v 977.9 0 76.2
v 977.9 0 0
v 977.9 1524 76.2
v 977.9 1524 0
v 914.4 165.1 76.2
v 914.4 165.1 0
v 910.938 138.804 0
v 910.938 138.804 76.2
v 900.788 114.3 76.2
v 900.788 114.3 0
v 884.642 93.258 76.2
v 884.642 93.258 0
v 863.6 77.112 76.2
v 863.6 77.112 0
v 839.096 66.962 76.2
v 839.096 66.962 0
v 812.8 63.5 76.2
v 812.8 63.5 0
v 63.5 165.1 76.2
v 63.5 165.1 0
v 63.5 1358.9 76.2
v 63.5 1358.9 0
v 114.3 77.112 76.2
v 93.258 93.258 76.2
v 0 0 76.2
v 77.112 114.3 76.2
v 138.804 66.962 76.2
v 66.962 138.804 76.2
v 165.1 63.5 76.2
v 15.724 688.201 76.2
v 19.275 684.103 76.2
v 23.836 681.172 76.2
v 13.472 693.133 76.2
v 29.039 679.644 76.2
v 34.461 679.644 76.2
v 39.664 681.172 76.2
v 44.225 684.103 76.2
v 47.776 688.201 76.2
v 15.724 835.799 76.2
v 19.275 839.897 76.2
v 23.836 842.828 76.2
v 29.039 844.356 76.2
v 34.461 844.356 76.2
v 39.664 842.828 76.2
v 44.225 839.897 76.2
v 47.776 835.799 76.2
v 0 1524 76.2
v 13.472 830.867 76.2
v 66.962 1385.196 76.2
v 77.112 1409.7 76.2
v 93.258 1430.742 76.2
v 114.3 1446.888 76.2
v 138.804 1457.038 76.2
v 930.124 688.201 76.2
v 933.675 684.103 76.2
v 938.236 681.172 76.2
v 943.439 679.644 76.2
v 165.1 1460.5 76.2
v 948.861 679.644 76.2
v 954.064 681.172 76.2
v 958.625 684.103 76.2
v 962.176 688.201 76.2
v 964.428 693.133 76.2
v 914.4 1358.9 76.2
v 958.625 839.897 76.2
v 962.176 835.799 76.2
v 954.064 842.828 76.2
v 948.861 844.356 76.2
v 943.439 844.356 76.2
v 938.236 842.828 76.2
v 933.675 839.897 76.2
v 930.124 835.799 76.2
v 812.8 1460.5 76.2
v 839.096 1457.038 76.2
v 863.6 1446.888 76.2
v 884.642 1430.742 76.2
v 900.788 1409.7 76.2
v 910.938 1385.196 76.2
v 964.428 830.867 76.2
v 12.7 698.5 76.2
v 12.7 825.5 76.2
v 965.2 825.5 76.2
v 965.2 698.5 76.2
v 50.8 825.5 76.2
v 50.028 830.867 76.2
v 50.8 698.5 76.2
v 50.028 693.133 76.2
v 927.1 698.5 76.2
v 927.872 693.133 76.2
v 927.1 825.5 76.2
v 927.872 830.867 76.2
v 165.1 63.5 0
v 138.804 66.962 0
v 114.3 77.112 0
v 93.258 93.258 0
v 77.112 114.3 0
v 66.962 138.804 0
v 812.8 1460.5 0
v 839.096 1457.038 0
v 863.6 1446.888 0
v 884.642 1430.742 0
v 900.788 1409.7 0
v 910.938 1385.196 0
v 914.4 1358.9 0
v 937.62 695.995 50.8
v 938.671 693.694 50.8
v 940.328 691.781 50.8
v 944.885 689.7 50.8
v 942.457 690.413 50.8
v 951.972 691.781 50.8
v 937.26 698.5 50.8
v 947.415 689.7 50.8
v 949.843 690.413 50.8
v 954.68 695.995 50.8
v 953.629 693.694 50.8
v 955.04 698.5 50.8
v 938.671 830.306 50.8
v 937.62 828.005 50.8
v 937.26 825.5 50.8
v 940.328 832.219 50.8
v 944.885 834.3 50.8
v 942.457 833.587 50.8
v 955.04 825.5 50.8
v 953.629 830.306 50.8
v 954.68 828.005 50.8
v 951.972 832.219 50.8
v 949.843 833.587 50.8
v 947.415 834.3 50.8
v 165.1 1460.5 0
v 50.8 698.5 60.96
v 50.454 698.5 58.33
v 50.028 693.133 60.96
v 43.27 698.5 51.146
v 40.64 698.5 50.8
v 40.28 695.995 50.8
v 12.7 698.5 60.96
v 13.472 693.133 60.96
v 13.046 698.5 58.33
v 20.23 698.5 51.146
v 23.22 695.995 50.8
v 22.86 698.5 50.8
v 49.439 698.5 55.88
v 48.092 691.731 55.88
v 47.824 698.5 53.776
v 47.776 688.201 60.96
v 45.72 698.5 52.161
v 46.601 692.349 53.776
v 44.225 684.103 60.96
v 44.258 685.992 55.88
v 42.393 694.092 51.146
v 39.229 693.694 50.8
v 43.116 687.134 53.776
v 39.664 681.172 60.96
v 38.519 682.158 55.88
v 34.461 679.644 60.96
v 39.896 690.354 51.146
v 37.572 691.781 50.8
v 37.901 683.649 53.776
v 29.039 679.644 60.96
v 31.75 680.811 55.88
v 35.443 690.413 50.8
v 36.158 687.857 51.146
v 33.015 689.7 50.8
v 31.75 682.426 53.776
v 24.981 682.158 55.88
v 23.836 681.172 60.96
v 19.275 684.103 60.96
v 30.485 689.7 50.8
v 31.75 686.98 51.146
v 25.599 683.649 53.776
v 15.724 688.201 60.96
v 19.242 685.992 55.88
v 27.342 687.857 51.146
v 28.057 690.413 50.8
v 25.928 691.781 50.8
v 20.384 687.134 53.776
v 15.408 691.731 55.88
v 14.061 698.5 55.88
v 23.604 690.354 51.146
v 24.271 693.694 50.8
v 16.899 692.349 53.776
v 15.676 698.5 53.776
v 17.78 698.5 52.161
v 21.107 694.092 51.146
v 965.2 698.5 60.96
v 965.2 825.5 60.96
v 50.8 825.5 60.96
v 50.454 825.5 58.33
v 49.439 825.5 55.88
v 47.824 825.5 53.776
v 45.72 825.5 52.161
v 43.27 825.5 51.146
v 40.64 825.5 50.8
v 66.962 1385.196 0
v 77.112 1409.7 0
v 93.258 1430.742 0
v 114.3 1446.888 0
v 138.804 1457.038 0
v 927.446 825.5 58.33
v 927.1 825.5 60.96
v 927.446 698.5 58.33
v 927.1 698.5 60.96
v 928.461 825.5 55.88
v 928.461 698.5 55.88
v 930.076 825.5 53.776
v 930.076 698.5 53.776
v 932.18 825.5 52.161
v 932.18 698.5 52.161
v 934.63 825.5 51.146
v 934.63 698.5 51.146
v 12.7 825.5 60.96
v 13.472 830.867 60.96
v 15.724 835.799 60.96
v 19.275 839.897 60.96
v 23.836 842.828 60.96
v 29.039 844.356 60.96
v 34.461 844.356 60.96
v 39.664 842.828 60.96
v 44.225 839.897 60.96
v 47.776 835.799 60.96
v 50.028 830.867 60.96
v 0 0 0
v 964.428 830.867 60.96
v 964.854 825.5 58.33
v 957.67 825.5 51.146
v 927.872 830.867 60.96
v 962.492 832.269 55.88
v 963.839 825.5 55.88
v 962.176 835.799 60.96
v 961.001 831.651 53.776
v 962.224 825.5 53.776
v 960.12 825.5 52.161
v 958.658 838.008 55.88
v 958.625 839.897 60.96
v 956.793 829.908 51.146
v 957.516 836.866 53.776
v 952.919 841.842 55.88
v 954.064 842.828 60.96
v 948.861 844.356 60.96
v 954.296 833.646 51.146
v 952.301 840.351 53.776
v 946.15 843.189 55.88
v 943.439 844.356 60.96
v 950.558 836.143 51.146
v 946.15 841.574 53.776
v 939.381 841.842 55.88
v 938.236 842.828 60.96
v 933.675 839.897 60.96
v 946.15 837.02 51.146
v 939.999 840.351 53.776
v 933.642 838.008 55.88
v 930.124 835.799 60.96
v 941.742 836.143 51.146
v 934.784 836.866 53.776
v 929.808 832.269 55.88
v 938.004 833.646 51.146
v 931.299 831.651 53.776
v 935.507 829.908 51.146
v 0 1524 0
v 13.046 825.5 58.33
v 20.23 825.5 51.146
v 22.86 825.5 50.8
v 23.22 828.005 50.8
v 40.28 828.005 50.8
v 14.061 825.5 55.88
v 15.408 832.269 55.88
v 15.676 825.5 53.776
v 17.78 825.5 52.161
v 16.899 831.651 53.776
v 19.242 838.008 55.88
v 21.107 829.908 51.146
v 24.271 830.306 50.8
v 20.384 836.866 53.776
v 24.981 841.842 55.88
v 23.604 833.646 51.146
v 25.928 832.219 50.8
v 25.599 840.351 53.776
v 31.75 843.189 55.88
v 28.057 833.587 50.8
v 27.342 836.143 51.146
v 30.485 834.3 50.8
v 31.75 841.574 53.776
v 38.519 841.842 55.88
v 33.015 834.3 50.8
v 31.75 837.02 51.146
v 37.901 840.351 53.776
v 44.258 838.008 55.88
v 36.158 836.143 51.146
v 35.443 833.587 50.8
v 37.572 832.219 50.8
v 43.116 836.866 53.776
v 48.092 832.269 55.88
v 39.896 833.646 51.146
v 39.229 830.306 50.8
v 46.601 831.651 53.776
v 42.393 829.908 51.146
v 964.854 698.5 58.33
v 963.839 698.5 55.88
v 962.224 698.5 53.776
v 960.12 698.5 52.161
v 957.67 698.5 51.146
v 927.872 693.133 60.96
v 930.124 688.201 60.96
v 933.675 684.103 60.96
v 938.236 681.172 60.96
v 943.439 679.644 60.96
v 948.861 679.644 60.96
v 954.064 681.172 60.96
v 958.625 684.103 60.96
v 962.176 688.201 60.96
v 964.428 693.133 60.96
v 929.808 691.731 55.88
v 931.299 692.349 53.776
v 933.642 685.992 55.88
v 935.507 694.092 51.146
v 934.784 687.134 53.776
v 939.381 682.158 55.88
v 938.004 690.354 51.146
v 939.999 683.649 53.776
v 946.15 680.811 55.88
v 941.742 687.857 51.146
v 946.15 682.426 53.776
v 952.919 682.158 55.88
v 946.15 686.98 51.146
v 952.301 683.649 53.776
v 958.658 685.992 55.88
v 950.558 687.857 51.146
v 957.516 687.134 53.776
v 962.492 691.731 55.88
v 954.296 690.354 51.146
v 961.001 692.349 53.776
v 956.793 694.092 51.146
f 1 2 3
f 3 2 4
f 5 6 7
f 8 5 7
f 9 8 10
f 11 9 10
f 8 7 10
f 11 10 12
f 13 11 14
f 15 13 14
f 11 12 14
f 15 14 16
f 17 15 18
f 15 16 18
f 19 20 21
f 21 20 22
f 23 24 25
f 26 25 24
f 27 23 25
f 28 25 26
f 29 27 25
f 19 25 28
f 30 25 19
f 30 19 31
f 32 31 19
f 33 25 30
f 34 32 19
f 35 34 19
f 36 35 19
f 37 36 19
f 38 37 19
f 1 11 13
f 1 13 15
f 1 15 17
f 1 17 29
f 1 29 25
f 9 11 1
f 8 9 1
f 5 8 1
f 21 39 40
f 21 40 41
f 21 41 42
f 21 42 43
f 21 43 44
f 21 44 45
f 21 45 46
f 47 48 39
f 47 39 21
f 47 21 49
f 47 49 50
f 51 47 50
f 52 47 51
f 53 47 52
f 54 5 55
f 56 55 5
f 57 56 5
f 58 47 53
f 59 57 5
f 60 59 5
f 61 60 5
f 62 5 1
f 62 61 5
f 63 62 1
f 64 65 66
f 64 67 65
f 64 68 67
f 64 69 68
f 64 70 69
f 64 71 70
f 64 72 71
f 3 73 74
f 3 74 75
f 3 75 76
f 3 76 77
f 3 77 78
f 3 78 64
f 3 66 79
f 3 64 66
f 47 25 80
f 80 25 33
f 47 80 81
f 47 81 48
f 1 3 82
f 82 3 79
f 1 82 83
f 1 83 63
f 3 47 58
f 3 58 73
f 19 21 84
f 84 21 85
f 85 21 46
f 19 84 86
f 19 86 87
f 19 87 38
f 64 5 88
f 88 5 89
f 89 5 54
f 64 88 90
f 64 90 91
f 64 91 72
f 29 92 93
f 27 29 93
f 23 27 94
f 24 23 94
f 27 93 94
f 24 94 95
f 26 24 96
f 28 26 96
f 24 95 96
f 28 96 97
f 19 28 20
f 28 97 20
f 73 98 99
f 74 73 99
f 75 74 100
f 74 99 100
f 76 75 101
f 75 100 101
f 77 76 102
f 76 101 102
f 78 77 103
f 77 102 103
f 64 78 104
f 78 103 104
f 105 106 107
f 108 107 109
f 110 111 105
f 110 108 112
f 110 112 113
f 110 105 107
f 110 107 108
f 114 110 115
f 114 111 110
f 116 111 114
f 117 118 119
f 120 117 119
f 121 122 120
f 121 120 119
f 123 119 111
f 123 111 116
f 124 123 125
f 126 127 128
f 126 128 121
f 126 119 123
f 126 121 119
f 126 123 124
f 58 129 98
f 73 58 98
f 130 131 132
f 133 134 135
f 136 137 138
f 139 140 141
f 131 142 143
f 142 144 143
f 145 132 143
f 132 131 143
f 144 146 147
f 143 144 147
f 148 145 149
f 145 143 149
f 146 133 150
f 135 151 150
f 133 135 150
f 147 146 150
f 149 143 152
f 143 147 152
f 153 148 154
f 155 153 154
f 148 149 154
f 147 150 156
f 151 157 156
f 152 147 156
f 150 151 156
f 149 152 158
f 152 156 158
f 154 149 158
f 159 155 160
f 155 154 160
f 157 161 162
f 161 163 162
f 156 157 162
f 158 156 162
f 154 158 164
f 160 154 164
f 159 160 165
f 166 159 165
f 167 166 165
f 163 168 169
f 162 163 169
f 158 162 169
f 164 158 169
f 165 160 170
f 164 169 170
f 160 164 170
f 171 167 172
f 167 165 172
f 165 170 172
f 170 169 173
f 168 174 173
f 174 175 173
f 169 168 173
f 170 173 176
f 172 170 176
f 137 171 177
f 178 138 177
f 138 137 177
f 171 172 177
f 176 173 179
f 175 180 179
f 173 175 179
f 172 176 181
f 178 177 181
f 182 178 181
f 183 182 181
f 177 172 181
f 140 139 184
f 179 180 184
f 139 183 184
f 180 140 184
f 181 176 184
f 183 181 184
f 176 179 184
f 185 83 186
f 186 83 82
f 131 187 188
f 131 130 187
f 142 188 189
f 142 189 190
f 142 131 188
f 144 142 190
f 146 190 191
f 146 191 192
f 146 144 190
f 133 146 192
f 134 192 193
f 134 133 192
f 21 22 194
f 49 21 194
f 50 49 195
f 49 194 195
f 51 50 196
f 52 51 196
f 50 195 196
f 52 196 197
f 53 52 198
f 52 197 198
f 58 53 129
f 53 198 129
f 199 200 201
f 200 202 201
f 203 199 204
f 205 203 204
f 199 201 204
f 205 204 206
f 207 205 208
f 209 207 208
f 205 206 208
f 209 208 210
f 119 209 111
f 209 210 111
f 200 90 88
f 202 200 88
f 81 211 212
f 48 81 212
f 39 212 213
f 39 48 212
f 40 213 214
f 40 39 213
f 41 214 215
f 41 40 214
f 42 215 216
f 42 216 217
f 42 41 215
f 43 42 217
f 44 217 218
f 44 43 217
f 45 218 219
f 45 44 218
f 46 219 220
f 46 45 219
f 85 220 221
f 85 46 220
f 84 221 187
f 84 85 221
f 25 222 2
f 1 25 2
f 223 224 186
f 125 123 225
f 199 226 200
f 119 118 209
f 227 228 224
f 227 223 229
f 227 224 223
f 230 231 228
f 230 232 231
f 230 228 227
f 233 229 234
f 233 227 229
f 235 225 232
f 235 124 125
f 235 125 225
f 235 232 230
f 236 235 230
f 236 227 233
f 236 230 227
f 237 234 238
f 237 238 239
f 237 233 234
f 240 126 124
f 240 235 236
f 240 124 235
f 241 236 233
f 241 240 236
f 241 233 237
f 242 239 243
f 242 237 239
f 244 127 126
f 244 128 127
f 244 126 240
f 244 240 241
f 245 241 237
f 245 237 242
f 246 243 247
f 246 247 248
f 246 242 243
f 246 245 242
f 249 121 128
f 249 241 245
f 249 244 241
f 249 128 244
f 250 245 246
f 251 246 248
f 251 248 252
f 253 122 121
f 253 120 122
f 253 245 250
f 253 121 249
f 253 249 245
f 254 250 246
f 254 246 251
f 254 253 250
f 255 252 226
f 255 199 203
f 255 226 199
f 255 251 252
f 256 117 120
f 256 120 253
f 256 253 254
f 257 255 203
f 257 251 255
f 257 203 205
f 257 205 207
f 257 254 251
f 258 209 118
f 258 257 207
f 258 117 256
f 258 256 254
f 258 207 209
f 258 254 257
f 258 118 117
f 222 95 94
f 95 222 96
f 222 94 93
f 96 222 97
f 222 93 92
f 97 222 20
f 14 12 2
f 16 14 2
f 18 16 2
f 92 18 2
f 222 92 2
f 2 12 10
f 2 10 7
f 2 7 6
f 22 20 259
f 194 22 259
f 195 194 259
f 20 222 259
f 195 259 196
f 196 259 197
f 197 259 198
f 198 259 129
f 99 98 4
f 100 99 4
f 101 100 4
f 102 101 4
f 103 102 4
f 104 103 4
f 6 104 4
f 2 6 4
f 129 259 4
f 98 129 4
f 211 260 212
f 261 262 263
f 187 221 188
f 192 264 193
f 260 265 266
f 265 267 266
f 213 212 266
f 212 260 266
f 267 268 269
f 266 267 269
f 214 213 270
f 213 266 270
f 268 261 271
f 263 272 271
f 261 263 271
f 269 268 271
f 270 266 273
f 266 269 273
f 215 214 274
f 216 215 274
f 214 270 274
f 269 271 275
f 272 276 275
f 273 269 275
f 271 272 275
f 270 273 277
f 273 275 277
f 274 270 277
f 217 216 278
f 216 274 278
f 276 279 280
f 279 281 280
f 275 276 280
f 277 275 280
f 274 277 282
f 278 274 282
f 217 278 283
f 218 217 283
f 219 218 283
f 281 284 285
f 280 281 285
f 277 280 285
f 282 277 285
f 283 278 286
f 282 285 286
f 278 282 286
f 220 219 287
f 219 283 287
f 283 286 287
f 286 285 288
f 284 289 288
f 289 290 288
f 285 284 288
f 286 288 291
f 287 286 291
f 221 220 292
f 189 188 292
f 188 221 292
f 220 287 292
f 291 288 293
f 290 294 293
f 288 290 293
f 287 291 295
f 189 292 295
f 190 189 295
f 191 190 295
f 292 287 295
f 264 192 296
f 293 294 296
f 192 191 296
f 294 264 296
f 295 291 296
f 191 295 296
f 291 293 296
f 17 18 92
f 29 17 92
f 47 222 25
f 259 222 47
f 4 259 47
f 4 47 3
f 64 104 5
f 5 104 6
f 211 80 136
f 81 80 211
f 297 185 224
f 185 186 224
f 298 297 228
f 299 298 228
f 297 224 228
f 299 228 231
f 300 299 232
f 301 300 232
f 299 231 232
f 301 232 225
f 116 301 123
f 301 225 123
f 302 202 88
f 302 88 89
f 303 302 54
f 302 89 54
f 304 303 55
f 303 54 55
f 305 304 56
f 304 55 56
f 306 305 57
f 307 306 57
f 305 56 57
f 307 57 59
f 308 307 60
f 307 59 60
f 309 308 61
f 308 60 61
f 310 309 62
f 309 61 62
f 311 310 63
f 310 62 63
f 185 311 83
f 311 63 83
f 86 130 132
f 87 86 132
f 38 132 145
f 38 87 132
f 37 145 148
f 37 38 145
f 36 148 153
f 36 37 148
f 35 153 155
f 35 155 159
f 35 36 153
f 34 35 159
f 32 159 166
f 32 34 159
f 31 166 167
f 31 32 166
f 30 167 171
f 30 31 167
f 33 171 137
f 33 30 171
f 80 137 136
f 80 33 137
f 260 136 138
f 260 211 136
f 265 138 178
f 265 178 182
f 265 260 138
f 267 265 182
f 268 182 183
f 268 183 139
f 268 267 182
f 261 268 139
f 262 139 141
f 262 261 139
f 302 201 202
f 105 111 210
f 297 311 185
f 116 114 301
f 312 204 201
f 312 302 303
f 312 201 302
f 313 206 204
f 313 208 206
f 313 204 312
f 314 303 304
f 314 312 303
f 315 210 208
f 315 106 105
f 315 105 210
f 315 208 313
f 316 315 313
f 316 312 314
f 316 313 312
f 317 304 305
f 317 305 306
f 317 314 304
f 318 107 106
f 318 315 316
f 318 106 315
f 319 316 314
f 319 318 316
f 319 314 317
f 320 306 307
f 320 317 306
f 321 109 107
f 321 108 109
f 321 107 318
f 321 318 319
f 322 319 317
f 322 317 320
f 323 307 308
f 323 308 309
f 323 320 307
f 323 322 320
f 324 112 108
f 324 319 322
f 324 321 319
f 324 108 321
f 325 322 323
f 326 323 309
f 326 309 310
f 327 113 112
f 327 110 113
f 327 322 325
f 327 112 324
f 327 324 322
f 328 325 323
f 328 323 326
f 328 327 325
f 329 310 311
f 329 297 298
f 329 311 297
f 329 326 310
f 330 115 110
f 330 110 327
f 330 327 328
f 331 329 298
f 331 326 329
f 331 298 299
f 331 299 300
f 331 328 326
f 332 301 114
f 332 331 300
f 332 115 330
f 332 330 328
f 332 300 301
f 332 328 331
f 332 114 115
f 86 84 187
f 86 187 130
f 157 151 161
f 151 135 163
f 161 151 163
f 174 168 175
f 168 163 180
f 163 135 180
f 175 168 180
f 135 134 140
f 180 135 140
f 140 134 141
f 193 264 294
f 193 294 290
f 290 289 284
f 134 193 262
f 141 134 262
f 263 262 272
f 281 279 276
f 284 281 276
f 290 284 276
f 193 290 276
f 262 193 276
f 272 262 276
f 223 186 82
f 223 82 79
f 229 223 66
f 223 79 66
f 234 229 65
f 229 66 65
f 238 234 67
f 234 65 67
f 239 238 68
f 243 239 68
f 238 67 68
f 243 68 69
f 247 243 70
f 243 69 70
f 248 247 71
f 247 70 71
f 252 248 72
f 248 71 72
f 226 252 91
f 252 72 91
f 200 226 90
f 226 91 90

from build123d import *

# Parameters (mm, degrees)
SKETCH1_W           = 977.9
SKETCH1_H           = 1524
BOSS_EXTRUDE1_DEPTH = 76.2
CUT_EXTRUDE1_DEPTH  = 25.4
FILLET1_R           = 10.16


with BuildPart() as part:
    # Sketch1 → Boss-Extrude1 (new body)
    with BuildSketch(Plane.XY):
        with Locations((488.95, 762)):
            Rectangle(SKETCH1_W, SKETCH1_H)
        with BuildLine():
            Line((63.5, 165.1), (63.5, 1358.9))
            ThreePointArc((63.5, 1358.9), (93.257951031, 1430.742048969), (165.1, 1460.5))
            Line((165.1, 1460.5), (812.8, 1460.5))
            ThreePointArc((812.8, 1460.5), (884.642048969, 1430.742048969), (914.4, 1358.9))
            Line((914.4, 1358.9), (914.4, 165.1))
            ThreePointArc((914.4, 165.1), (884.642048969, 93.257951031), (812.8, 63.5))
            Line((812.8, 63.5), (165.1, 63.5))
            ThreePointArc((165.1, 63.5), (93.257951031, 93.257951031), (63.5, 165.1))
        make_face(mode=Mode.SUBTRACT)
    extrude(amount=BOSS_EXTRUDE1_DEPTH)

    # Sketch2 → Cut-Extrude1 (cut)
    with BuildSketch(Plane.XY.offset(76.2)):
        with BuildLine():
            Line((50.8, 825.5), (50.8, 698.5))
            ThreePointArc((50.8, 698.5), (31.75, 679.45), (12.7, 698.5))
            Line((12.7, 698.5), (12.7, 825.5))
            ThreePointArc((12.7, 825.5), (31.75, 844.55), (50.8, 825.5))
        make_face()
        with BuildLine():
            Line((927.1, 825.5), (927.1, 698.5))
            ThreePointArc((927.1, 698.5), (946.15, 679.45), (965.2, 698.5))
            Line((965.2, 698.5), (965.2, 825.5))
            ThreePointArc((965.2, 825.5), (946.15, 844.55), (927.1, 825.5))
        make_face()
    extrude(amount=-CUT_EXTRUDE1_DEPTH, mode=Mode.SUBTRACT)

    # Fillet1
    fillet1_edges = [part.edges().sort_by_distance(p)[0] for p in [
        (31.75, 844.55, 50.8),
        (50.8, 762, 50.8),
        (31.75, 679.45, 50.8),
        (12.7, 762, 50.8),
        (946.15, 844.55, 50.8),
        (965.2, 762, 50.8),
        (946.15, 679.45, 50.8),
        (927.1, 762, 50.8),
    ]]
    fillet(fillet1_edges, radius=FILLET1_R)


solid = part.part
